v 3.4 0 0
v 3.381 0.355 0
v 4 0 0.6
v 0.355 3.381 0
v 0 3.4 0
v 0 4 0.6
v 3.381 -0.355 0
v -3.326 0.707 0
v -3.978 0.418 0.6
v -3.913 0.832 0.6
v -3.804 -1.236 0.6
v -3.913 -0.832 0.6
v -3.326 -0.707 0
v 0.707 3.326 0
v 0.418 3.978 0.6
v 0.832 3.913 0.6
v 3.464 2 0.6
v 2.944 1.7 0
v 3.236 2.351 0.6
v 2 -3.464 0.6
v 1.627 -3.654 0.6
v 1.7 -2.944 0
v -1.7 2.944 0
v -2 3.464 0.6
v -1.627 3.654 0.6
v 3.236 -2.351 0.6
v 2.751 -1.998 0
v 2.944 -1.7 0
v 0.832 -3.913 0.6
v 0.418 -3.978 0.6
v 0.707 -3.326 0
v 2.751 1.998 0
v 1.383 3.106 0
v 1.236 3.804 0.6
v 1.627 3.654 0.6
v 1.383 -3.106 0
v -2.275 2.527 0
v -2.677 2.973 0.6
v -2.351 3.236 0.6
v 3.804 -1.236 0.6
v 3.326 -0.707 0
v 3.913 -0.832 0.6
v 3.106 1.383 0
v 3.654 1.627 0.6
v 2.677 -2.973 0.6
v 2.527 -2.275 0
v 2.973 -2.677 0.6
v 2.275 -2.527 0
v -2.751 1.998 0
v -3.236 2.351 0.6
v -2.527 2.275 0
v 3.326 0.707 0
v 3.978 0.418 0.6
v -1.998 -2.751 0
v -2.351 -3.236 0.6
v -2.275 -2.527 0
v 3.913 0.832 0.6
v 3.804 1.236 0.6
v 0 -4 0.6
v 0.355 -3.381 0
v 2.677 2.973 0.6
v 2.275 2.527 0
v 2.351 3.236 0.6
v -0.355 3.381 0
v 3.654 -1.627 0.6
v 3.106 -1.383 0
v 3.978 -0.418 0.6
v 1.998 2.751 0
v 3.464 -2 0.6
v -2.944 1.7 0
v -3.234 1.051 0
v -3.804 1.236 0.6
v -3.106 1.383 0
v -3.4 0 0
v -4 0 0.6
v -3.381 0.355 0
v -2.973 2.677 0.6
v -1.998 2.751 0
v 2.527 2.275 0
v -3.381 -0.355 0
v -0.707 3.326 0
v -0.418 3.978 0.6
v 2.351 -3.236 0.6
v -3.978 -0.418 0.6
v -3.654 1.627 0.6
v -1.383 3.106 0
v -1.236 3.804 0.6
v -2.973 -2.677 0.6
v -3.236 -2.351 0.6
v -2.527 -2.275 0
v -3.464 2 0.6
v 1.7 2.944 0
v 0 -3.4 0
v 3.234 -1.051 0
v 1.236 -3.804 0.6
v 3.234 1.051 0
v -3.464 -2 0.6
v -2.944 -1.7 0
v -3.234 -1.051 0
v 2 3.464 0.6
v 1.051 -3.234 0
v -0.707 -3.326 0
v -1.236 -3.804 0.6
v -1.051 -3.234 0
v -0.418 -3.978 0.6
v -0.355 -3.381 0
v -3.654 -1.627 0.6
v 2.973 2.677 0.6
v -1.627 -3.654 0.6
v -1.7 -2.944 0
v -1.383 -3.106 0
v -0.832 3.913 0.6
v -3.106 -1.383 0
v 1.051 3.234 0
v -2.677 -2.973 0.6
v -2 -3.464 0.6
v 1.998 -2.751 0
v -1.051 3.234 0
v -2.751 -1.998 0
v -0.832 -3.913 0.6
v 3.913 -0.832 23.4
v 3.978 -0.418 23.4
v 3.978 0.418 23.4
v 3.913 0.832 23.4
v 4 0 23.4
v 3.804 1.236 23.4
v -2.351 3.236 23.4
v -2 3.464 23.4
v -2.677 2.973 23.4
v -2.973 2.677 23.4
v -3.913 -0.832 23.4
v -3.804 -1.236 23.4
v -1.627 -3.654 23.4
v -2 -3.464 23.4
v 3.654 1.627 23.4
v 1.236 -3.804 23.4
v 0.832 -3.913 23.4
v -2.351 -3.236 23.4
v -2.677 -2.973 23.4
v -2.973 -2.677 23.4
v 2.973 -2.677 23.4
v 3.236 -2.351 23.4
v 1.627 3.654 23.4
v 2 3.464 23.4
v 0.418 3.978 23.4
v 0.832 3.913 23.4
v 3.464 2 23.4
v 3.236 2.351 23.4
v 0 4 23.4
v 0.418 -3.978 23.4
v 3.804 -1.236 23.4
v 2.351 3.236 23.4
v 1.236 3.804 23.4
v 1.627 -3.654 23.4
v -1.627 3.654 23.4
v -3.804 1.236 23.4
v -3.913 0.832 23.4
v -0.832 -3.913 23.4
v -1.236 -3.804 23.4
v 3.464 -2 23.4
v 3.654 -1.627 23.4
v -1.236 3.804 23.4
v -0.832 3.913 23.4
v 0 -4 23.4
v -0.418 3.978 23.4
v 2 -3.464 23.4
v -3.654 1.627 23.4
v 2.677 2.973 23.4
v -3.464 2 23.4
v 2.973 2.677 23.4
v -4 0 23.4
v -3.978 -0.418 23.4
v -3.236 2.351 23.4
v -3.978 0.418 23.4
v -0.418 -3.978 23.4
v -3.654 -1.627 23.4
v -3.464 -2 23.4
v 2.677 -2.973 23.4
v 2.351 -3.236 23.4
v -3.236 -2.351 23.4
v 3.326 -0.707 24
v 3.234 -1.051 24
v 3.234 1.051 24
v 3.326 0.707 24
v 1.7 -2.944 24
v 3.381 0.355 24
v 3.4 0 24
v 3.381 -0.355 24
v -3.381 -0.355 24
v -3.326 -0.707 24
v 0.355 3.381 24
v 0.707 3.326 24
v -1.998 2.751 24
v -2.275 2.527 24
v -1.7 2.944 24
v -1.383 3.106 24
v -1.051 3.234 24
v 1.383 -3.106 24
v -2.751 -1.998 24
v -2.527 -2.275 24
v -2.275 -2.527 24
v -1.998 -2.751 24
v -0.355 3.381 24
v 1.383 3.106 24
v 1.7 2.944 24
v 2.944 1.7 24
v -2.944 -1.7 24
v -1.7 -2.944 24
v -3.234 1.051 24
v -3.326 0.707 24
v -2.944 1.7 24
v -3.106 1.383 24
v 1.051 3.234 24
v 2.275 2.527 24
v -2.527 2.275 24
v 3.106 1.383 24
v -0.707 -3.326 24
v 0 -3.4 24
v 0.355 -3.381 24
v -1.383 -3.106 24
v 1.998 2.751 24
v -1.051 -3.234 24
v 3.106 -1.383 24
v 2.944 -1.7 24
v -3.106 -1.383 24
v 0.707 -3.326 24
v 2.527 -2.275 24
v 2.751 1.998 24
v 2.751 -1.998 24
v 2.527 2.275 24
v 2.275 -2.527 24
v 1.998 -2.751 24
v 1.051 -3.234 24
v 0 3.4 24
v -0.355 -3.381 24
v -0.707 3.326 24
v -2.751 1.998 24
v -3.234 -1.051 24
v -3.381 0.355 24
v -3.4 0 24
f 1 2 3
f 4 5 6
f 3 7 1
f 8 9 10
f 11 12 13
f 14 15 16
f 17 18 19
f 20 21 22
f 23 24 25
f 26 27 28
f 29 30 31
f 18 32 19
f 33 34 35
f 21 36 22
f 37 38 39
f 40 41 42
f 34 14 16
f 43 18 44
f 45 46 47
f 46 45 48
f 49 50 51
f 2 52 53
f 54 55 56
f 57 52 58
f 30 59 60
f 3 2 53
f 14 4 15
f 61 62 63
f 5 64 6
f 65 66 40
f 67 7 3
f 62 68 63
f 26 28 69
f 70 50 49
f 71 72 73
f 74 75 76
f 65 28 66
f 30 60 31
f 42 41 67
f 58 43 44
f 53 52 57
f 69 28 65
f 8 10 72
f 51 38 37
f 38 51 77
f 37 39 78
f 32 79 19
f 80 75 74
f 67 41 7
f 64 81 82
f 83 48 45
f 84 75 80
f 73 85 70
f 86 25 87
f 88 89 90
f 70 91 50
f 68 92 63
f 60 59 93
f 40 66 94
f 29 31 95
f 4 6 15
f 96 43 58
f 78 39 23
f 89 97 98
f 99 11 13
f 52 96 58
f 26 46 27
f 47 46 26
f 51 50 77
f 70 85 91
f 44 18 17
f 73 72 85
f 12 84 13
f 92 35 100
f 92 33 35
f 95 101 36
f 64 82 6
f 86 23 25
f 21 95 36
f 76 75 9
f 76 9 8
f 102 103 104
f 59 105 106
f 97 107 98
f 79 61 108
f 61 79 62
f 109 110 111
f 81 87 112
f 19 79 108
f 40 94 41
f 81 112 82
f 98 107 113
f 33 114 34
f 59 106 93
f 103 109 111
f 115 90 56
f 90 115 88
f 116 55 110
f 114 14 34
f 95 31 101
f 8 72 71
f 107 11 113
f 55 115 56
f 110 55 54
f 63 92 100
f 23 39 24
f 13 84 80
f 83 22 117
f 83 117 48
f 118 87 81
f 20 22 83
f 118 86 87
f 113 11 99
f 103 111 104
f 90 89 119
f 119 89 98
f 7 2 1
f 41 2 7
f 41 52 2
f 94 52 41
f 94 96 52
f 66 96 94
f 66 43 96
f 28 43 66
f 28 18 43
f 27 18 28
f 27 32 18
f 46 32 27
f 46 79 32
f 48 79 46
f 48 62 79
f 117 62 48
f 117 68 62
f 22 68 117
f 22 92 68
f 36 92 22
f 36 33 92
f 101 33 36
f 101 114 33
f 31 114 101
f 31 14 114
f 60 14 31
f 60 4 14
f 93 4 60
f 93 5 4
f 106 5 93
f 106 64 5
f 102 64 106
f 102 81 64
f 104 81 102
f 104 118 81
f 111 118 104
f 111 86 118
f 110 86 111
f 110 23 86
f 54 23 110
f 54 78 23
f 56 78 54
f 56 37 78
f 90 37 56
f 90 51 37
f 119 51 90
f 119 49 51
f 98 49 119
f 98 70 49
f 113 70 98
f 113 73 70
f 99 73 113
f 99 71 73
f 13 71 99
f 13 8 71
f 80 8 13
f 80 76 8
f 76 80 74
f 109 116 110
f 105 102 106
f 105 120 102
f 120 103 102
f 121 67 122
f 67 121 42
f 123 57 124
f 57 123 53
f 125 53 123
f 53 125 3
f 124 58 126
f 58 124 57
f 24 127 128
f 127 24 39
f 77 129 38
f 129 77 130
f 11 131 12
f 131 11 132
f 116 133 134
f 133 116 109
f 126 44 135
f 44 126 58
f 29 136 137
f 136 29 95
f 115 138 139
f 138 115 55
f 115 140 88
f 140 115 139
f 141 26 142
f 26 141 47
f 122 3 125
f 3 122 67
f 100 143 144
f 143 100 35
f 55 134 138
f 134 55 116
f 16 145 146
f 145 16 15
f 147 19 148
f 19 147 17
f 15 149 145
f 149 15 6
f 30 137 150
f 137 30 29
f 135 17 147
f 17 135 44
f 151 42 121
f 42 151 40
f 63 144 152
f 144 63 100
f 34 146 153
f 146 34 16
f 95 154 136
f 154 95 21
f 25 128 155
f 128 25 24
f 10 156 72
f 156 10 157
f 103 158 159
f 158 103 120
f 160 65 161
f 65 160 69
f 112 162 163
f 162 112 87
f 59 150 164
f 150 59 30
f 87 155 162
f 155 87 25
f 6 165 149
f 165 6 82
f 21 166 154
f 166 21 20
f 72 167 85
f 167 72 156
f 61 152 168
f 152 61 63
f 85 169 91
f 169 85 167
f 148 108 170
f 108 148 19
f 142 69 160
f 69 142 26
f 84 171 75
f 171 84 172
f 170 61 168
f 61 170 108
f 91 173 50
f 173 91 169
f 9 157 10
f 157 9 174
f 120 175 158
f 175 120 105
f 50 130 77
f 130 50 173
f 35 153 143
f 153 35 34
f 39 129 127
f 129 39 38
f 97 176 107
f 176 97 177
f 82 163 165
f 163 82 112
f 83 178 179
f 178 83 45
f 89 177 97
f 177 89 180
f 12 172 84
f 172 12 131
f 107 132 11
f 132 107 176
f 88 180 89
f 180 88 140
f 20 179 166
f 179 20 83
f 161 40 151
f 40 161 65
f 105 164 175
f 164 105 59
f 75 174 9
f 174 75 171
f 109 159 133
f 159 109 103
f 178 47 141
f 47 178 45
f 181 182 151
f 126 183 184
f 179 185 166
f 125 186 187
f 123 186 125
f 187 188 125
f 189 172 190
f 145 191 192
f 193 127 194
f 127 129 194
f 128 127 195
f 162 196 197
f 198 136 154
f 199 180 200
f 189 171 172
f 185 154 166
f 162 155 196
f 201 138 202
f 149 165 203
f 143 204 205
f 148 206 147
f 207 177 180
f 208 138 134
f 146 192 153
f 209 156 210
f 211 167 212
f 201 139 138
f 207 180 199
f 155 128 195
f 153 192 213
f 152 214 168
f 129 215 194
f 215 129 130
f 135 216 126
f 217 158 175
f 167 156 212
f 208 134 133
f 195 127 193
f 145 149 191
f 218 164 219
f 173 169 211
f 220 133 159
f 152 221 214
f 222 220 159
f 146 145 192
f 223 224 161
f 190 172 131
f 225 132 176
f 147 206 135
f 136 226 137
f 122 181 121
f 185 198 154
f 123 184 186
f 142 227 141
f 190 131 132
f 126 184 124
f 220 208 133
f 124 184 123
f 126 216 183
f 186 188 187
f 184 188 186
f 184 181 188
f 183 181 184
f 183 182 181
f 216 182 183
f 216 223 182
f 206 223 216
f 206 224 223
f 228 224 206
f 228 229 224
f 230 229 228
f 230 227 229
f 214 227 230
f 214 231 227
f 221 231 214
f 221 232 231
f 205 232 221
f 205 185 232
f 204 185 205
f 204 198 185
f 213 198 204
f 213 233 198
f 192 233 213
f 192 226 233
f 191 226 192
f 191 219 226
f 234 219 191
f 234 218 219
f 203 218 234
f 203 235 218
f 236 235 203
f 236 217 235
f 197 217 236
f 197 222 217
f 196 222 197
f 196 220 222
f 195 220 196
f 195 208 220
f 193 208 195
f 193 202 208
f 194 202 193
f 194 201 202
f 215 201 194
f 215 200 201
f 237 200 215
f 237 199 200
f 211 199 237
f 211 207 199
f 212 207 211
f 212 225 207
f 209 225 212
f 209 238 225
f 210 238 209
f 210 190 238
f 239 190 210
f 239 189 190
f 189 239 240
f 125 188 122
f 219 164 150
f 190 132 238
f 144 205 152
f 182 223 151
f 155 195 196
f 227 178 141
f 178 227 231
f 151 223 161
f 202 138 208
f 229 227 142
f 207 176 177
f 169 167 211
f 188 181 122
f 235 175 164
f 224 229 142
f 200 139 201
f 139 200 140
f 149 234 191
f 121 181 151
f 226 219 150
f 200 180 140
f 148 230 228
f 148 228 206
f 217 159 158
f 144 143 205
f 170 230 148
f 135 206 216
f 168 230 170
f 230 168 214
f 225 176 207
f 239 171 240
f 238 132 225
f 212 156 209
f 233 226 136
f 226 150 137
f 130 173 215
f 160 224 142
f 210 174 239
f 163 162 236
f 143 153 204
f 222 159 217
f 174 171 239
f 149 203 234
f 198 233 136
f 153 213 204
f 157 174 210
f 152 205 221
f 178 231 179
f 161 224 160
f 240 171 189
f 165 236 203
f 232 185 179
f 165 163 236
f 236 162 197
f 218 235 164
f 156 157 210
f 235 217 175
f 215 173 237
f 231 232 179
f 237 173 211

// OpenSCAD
// Chamfered dowel pin.
$fn = 60;
eps = 0.02;
diameter = 8;
length = 24;
chamfer = 0.6;
union() {
    cylinder(d1 = diameter - 2 * chamfer, d2 = diameter, h = chamfer);
    translate([0, 0, chamfer]) cylinder(d = diameter, h = length - 2 * chamfer);
    translate([0, 0, length - chamfer]) cylinder(d1 = diameter, d2 = diameter - 2 * chamfer, h = chamfer);
}
